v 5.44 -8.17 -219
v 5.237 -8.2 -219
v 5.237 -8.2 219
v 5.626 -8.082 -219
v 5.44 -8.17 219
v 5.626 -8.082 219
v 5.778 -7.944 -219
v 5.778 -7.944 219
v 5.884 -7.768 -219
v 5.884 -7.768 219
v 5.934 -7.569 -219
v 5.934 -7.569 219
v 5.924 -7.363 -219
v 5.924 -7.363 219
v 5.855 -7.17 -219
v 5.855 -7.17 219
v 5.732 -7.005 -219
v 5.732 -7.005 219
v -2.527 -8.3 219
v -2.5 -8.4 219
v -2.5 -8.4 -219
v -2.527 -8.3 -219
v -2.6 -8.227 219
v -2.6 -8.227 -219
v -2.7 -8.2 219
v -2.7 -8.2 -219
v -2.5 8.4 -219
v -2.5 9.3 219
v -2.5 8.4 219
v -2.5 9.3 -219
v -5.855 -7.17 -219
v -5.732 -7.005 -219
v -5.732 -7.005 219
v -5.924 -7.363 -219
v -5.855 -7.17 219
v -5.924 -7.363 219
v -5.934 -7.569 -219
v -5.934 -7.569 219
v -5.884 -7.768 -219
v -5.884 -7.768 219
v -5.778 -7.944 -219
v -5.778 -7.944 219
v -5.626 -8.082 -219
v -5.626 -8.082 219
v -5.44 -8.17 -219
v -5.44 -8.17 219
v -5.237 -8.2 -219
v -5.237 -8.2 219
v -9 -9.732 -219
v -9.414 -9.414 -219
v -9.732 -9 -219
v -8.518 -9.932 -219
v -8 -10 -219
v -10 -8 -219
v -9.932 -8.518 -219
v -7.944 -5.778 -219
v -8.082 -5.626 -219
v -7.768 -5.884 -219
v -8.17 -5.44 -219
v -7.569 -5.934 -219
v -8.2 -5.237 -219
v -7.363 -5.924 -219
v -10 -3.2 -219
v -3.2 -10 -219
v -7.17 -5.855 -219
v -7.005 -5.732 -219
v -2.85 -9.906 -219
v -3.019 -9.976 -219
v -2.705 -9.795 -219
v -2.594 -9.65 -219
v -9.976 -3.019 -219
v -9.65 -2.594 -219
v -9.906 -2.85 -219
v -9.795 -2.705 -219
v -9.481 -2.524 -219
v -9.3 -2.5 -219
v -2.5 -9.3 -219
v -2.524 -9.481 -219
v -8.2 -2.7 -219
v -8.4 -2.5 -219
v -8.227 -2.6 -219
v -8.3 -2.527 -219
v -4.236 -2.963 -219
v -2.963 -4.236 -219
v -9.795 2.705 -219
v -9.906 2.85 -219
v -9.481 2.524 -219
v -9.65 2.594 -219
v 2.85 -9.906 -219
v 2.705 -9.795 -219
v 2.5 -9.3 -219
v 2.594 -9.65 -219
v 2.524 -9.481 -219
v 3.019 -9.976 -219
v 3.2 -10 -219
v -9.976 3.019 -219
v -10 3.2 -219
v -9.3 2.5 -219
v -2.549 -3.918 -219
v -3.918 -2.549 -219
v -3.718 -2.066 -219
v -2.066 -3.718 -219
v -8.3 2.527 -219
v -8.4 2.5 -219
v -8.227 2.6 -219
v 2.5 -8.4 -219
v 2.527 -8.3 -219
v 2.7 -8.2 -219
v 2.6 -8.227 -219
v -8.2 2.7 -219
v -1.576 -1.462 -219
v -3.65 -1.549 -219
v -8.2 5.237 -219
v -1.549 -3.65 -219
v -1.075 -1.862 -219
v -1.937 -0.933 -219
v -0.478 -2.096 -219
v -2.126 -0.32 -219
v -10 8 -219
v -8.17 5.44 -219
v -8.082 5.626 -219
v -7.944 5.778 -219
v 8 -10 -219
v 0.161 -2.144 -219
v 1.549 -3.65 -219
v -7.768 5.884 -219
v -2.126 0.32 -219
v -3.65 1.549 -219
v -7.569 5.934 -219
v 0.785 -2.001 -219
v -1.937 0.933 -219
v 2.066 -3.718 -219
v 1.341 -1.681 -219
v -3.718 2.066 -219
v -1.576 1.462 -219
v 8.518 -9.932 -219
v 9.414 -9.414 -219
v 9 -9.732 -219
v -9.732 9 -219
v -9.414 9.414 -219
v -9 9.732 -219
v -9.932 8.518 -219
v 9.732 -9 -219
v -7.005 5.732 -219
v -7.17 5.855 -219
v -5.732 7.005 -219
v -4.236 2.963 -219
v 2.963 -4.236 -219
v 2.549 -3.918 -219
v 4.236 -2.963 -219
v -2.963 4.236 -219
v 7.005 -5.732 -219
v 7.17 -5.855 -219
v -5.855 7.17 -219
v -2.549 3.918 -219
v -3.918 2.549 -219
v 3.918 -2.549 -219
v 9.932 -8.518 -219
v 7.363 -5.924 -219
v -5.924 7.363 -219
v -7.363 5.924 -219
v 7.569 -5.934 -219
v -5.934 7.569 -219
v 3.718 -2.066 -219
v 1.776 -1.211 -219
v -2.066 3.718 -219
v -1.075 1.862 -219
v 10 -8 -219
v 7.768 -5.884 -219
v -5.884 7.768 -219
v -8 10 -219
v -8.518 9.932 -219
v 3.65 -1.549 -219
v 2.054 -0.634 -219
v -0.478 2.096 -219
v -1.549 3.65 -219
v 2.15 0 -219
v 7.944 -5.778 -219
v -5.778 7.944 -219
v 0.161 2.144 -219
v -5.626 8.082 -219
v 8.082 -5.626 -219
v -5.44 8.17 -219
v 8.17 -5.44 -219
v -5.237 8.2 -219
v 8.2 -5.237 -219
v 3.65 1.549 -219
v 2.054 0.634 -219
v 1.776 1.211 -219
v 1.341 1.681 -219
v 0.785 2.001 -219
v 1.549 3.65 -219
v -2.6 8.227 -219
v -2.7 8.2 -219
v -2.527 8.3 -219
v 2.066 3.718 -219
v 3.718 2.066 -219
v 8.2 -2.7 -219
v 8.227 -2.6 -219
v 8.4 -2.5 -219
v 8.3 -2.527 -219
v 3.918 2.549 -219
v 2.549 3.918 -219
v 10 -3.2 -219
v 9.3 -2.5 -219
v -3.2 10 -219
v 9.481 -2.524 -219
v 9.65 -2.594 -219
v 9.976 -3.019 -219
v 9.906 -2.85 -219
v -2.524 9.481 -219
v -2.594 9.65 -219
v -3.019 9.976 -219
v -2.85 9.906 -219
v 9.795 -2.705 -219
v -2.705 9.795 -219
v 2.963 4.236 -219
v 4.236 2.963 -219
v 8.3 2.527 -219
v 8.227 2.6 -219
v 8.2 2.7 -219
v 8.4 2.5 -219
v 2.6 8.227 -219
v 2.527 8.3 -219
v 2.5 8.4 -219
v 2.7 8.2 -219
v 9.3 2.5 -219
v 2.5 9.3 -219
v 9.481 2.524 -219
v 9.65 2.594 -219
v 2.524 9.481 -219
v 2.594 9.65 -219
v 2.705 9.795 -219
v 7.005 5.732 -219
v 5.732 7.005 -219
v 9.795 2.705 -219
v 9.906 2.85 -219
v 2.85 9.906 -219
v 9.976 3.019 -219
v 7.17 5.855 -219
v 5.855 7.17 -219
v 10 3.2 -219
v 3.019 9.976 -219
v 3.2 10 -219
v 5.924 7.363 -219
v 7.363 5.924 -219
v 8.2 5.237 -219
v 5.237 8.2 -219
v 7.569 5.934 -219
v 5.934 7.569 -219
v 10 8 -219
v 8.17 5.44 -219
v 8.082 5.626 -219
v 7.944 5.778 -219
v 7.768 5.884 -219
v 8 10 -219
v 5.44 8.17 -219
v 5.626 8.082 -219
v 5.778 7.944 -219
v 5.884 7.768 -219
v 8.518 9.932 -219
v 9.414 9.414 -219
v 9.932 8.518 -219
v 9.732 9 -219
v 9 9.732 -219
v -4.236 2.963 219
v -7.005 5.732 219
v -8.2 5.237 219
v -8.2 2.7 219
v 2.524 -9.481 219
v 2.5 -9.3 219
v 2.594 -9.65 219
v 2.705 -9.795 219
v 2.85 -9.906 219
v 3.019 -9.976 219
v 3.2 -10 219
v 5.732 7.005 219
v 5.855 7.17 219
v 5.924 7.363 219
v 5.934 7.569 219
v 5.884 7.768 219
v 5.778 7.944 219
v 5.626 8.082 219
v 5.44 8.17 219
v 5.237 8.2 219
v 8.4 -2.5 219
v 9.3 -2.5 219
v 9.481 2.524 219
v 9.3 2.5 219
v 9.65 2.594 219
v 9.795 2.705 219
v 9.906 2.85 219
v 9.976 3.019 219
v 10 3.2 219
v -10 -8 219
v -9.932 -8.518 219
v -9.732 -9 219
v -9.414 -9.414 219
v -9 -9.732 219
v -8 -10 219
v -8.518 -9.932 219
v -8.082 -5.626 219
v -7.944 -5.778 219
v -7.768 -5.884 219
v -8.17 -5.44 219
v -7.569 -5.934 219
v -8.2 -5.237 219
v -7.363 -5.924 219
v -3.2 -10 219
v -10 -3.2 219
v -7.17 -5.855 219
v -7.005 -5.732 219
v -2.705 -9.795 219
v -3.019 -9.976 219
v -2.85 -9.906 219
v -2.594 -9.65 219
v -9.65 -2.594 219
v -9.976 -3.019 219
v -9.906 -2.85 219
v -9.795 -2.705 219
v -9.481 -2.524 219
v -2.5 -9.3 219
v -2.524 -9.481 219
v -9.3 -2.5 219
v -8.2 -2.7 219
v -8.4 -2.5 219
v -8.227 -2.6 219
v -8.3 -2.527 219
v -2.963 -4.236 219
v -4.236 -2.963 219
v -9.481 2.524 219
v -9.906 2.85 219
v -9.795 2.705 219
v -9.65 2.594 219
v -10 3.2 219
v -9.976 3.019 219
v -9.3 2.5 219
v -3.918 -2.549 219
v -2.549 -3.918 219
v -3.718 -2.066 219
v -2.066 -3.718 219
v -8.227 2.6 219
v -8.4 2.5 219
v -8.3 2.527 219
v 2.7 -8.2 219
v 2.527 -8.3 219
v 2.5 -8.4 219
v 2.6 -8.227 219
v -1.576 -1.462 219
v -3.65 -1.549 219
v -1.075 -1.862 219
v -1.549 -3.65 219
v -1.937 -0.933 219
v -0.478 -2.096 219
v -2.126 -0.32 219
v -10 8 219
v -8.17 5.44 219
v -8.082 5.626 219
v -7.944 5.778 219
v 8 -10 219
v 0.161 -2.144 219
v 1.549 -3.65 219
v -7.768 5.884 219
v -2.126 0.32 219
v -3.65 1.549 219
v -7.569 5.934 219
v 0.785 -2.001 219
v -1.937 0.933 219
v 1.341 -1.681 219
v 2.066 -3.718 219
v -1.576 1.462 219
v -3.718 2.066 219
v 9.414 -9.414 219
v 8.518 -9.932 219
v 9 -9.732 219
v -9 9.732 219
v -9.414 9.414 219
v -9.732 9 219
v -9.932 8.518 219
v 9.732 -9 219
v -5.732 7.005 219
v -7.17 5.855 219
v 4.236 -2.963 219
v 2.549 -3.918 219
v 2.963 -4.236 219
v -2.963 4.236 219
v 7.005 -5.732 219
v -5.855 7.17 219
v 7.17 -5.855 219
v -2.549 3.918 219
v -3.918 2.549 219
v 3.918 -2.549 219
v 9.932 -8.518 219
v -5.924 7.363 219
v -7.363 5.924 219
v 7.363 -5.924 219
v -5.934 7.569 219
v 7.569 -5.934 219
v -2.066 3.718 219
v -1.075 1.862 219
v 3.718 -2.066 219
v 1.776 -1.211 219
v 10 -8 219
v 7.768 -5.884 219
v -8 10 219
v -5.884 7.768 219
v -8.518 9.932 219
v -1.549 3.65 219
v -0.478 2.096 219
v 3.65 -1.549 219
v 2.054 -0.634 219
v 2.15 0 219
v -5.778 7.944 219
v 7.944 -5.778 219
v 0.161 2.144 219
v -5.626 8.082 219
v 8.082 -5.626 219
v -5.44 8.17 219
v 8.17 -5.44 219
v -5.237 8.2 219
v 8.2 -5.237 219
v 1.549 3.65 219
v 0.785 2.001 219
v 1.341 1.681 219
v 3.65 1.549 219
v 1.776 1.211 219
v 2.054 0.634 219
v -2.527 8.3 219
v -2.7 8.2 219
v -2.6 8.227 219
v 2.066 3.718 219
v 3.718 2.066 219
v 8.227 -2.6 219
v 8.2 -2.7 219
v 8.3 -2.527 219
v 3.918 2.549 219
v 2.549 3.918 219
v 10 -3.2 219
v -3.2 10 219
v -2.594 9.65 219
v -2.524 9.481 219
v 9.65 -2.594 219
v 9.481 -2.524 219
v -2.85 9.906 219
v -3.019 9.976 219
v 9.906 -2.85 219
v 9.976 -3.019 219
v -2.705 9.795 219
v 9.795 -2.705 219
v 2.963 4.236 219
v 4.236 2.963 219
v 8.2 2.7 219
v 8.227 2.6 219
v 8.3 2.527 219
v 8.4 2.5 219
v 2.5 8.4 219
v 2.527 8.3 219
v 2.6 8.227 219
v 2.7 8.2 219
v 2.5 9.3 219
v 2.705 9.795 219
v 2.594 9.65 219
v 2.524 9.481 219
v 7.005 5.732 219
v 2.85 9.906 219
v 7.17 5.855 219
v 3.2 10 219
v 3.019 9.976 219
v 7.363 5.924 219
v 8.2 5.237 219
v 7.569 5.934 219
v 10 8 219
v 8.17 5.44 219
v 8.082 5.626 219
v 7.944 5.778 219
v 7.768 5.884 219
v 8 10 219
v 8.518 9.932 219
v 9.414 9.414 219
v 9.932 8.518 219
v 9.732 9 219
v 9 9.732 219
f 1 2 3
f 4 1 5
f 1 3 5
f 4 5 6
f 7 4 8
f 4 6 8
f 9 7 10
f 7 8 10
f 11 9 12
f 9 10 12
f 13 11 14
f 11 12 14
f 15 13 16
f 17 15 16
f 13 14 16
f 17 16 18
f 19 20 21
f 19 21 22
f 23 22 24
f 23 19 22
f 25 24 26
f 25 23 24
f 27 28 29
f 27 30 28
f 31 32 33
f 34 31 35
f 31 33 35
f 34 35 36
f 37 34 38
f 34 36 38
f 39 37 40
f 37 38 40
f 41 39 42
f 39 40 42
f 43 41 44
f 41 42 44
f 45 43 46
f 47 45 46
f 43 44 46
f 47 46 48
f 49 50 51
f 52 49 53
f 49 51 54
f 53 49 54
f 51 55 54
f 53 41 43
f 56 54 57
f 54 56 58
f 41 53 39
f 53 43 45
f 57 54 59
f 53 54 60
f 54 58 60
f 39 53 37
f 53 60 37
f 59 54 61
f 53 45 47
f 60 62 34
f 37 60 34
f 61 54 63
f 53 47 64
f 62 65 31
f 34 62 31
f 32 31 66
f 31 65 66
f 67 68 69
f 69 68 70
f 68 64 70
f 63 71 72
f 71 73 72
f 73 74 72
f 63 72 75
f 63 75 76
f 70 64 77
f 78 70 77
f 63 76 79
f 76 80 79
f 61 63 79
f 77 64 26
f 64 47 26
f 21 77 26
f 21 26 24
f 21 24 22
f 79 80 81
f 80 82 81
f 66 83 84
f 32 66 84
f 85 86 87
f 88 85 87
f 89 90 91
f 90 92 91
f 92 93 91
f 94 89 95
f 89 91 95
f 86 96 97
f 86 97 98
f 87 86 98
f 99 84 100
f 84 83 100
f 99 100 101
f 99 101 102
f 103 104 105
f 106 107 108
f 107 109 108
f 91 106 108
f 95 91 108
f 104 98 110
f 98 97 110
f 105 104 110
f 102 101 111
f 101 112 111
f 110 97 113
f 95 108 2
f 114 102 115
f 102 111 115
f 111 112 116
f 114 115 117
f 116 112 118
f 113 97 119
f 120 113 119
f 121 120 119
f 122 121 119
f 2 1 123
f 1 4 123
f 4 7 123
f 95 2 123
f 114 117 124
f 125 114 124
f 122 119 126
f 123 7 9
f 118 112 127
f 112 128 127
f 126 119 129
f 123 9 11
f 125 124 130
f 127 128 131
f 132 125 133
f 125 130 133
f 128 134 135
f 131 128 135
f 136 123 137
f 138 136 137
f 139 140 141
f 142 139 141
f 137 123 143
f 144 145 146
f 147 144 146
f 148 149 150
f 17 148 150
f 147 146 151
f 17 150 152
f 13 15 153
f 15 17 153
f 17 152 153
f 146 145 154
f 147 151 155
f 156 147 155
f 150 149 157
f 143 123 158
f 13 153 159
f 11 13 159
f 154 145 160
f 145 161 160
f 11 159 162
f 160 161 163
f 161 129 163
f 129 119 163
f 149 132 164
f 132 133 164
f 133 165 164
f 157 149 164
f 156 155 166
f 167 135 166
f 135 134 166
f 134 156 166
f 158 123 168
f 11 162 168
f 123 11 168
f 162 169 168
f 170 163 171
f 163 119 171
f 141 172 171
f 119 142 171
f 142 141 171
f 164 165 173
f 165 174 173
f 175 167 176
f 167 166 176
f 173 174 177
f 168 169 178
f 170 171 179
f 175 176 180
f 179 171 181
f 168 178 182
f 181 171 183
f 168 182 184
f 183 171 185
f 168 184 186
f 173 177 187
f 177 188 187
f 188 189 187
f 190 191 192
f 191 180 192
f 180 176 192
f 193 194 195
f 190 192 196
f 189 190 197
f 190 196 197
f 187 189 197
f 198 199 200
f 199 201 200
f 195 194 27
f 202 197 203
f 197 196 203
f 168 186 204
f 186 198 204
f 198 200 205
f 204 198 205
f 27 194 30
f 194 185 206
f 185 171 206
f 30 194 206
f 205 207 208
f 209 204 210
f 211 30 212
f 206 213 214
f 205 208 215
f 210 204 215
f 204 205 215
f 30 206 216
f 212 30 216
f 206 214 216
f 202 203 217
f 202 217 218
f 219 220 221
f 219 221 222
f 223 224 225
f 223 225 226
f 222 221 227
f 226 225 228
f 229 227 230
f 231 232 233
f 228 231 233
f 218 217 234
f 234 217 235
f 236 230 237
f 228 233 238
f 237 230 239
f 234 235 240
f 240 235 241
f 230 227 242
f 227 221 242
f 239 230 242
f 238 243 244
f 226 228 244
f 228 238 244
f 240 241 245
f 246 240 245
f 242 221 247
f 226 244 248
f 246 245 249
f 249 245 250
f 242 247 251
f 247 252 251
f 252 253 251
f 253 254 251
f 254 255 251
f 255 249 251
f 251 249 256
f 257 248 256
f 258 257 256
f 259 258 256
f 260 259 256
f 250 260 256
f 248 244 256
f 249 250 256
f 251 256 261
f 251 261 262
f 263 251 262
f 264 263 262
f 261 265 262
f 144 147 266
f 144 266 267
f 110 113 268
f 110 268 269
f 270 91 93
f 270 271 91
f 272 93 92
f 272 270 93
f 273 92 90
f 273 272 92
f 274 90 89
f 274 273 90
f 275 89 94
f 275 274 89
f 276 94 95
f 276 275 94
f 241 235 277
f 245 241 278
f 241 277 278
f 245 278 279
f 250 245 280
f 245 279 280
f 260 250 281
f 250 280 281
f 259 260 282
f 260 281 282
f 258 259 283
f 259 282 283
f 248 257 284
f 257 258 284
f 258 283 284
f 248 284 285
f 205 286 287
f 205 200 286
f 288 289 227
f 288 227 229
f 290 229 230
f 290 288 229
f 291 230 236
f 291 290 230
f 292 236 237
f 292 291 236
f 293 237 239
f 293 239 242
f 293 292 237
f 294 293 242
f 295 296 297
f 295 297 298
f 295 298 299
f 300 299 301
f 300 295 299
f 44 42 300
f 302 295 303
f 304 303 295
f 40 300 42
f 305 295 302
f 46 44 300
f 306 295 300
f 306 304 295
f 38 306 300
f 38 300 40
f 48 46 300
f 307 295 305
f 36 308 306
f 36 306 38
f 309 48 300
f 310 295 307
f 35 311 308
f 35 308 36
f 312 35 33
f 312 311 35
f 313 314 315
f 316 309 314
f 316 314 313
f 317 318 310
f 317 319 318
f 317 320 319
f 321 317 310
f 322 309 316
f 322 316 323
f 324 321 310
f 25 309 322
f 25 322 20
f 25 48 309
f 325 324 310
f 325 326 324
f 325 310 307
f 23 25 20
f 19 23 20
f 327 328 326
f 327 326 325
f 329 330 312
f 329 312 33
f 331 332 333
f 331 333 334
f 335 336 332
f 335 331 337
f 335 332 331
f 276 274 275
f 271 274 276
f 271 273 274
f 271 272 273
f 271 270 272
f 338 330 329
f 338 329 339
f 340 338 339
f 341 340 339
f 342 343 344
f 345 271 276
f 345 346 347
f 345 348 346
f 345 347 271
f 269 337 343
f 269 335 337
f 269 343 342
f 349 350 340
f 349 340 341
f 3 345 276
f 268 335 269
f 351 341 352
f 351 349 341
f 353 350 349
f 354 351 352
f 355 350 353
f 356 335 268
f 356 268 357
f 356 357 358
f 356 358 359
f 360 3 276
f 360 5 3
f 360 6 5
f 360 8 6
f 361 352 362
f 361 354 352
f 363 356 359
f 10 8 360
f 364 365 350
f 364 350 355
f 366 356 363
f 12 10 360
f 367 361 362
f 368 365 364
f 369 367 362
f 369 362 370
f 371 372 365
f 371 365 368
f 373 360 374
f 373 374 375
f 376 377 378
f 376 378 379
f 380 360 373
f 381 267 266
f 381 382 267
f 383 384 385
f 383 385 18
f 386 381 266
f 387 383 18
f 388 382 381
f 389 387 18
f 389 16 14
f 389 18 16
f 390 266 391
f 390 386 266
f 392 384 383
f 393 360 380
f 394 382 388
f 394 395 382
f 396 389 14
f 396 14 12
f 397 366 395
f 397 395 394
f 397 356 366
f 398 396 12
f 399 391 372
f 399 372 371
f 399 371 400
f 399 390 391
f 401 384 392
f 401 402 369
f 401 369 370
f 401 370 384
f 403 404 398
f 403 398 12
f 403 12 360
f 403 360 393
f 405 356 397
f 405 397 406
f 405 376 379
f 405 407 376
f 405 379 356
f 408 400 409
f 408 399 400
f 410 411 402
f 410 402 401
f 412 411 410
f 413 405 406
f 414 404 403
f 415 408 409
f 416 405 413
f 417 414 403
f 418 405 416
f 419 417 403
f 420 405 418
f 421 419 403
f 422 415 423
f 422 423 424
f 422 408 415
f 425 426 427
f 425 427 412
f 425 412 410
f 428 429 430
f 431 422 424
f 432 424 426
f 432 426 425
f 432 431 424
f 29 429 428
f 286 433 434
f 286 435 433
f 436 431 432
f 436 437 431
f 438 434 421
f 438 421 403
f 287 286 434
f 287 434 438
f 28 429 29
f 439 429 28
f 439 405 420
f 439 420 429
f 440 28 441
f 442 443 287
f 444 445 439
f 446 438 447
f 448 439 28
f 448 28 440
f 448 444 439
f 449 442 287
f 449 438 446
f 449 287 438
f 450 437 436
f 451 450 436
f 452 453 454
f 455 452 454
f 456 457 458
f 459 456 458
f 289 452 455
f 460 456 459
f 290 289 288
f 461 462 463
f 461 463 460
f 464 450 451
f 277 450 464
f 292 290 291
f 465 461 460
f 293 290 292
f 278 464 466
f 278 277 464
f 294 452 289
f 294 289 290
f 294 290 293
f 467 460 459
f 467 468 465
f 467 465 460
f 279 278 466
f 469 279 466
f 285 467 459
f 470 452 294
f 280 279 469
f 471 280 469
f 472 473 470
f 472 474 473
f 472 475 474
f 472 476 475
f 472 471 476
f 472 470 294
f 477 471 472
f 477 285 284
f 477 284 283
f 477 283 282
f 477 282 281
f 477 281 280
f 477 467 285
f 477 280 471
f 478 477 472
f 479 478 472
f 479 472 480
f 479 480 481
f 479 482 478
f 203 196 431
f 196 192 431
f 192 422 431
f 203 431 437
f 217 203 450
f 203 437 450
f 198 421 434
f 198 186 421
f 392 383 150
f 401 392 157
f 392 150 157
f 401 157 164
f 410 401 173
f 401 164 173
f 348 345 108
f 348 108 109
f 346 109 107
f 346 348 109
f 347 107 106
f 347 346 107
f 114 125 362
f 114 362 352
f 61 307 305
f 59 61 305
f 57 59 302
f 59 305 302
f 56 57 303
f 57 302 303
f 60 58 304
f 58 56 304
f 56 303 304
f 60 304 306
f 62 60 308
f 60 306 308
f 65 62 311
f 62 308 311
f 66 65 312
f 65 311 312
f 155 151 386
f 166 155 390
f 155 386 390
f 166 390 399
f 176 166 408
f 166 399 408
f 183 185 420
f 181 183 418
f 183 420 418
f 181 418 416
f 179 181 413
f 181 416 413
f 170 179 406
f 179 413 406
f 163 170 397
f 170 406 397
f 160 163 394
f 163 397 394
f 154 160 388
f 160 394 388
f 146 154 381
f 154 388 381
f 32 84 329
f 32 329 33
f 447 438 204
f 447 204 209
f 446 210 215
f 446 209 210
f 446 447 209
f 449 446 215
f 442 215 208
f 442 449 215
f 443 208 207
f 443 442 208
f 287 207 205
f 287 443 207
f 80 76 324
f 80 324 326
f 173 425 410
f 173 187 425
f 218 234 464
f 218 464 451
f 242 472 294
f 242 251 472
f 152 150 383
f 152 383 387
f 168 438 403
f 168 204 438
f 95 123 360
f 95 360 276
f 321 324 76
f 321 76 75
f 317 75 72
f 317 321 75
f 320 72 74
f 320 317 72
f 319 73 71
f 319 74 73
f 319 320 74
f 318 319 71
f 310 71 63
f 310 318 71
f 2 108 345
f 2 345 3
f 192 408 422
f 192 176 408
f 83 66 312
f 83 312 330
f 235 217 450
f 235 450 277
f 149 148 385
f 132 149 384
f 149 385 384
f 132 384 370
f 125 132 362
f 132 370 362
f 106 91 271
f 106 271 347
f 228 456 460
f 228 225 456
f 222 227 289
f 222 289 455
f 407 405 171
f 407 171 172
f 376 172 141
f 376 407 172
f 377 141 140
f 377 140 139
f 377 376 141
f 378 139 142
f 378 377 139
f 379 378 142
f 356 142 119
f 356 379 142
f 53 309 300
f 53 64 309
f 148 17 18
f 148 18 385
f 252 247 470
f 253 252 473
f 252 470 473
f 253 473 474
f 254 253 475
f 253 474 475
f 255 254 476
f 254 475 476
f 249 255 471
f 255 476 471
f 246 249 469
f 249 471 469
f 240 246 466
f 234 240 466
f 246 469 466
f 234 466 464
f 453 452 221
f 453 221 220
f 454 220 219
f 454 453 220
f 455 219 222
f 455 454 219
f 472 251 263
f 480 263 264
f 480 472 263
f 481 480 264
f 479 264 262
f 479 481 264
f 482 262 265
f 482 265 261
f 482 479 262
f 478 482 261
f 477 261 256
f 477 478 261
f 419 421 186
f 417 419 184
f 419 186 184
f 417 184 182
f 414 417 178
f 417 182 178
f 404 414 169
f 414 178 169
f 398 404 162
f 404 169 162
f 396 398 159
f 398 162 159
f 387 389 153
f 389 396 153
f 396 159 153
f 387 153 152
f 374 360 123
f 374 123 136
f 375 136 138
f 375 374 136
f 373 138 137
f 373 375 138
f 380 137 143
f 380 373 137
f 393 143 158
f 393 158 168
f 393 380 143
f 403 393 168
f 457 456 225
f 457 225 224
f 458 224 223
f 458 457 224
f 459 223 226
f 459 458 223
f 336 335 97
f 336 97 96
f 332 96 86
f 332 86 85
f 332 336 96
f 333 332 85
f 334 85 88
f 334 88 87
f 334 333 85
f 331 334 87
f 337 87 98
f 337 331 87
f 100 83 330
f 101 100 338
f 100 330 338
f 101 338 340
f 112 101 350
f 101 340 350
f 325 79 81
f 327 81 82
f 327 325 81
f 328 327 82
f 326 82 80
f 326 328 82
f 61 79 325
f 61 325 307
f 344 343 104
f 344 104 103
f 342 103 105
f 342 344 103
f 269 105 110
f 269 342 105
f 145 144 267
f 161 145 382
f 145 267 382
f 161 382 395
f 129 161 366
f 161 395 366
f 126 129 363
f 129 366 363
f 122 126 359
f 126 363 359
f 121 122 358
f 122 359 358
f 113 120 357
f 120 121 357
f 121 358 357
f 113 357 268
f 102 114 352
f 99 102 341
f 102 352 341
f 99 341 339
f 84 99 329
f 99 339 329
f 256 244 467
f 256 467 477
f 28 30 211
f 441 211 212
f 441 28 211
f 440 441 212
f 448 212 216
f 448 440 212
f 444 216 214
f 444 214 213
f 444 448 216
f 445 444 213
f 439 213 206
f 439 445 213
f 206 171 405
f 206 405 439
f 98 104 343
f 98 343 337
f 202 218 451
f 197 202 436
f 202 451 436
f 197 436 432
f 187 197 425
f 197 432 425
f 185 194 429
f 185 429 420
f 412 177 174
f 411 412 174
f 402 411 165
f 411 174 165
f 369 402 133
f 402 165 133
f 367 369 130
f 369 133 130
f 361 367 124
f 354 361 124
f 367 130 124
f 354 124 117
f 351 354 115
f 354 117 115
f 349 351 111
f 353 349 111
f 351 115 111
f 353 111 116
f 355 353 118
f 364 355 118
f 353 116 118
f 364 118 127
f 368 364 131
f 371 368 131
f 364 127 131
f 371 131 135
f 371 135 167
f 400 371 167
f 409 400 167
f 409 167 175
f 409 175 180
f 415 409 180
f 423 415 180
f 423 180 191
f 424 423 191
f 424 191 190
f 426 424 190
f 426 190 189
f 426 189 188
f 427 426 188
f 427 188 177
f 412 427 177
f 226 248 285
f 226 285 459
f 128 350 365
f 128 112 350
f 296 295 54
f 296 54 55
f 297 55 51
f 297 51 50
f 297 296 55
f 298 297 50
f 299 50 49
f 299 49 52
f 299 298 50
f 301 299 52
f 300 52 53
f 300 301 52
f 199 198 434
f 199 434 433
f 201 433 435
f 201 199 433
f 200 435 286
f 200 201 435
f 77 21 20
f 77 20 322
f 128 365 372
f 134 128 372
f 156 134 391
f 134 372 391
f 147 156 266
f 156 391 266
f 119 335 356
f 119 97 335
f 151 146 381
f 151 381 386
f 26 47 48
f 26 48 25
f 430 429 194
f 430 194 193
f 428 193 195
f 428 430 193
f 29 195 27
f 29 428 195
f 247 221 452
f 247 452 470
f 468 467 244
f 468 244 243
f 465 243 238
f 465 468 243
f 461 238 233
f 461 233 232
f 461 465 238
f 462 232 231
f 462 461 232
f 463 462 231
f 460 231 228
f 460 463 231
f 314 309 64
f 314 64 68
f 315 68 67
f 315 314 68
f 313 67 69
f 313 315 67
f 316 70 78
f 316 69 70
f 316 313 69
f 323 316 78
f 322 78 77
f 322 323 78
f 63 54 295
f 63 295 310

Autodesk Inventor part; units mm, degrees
ref_plane "YZ Plane" through (0, 0, 0) normal (1, 0, 0) x (0, 1, 0)
ref_plane "XZ Plane" through (0, 0, 0) normal (0, 1, 0) x (-1, 0, 0)
ref_plane "XY Plane" through (0, 0, 0) normal (0, 0, 1) x (1, 0, 0)
sketch "Sketch1" plane through (0, 0, 0) normal (0, 0, 1) x (1, 0, 0)
  circle A0 centre (0, 0) radius 2.15
  line L0 (-10, 10) -> (-2.5, 10)
  line L1 (-2.5, 10) -> (-2.5, 8.2)
  line L2 (-2.5, 8.2) -> (-6.9272, 8.2)
  line L3 (-6.9272, 8.2) -> (-2.3772, 3.65)
  line L4 (-2.3772, 3.65) -> (2.3772, 3.65)
  line L5 (2.3772, 3.65) -> (6.9272, 8.2)
  line L6 (6.9272, 8.2) -> (2.5, 8.2)
  line L7 (2.5, 8.2) -> (2.5, 10)
  line L8 (2.5, 10) -> (10, 10)
  line L9 (10, 10) -> (10, 2.5)
  line L10 (10, 2.5) -> (8.2, 2.5)
  line L11 (8.2, 2.5) -> (8.2, 6.9272)
  line L12 (8.2, 6.9272) -> (3.65, 2.3772)
  line L13 (3.65, 2.3772) -> (3.65, -2.3772)
  line L14 (3.65, -2.3772) -> (8.2, -6.9272)
  line L15 (8.2, -6.9272) -> (8.2, -2.5)
  line L16 (8.2, -2.5) -> (10, -2.5)
  line L17 (10, -2.5) -> (10, -10)
  line L18 (10, -10) -> (2.5, -10)
  line L19 (2.5, -10) -> (2.5, -8.2)
  line L20 (2.5, -8.2) -> (6.9272, -8.2)
  line L21 (6.9272, -8.2) -> (2.3772, -3.65)
  line L22 (2.3772, -3.65) -> (-2.3772, -3.65)
  line L23 (-2.3772, -3.65) -> (-6.9272, -8.2)
  line L24 (-6.9272, -8.2) -> (-2.5, -8.2)
  line L25 (-2.5, -8.2) -> (-2.5, -10)
  line L26 (-2.5, -10) -> (-10, -10)
  line L27 (-10, -10) -> (-10, -2.5)
  line L28 (-10, -2.5) -> (-8.2, -2.5)
  line L29 (-8.2, -2.5) -> (-8.2, -6.9272)
  line L30 (-8.2, -6.9272) -> (-3.65, -2.3772)
  line L31 (-3.65, -2.3772) -> (-3.65, 2.3772)
  line L32 (-3.65, 2.3772) -> (-8.2, 6.9272)
  line L33 (-8.2, 6.9272) -> (-8.2, 2.5)
  line L34 (-8.2, 2.5) -> (-10, 2.5)
  line L35 (-10, 2.5) -> (-10, 10)
  line L36 (0, 0) -> (-30.8654, 30.8654)
  line L37 (0, 0) -> (30.8654, 30.8654)
  line L38 (0, 0) -> (42.5392, 0)
  line L39 (0, 0) -> (0, 44.3419)
  dimension "d0" = 45
  dimension "d1" = 90
  dimension "Breite" = 20
  dimension "Tiefe_Schiene" = 6.35
  dimension "d2" = 1.8
  dimension "Durchmesser_Loch" = 4.3
  dimension "Wandstaerke" = 1.8
  dimension "d3" = 1.8
  dimension "Breite_Schiene" = 5
  dimension "d4" = 5
extrude "Extrusion1" add sketch "Sketch1" along normal mid plane 438 contours L38 L13 L14 L15 L16 L17 L18 L19 L20 L21 L22 L23 L24 L25 L26 L27 L28 L29 L30 L31 L32 L33 L34 L35 L36 A0 | A0 L37 L9 L10 L11 L12 L13 L38 | A0 L39 L4 L5 L6 L7 L8 L37 | L36 L0 L1 L2 L3 L4 L39 A0
fillet "Fillet1" radius 2 4 edges at (10, 10, 0) (-10, 10, 0) (10, -10, 0) (-10, -10, 0)
fillet "Fillet2" radius 0.2 8 edges at (-2.5, 8.2, 0) (2.5, 8.2, 0) (8.2, 2.5, 0) (8.2, -2.5, 0) (-2.5, -8.2, 0) (-8.2, -2.5, 0) (-8.2, 2.5, 0) (2.5, -8.2, 0)
fillet "Fillet3" radius 0.7 16 edges at (-2.5, 10, 0) (2.5, 10, 0) (10, 2.5, 0) (10, -2.5, 0) (2.5, -10, 0) (-2.5, -10, 0) (-10, -2.5, 0) (-10, 2.5, 0) (-6.9272, -8.2, 0) (-8.2, -6.9272, 0) (6.9272, -8.2, 0) (8.2, -6.9272, 0) (8.2, 6.9272, 0) (6.9272, 8.2, 0) (-6.9272, 8.2, 0) (-8.2, 6.9272, 0)
fillet "Fillet4" radius 2 8 edges at (-3.65, 2.3772, 0) (-2.3772, 3.65, 0) (2.3772, 3.65, 0) (3.65, 2.3772, 0) (3.65, -2.3772, 0) (2.3772, -3.65, 0) (-2.3772, -3.65, 0) (-3.65, -2.3772, 0)
equation "\"d2\" = Wandstaerke"
equation "\"d3\" = Wandstaerke"
equation "\"d4\" = Breite_Schiene"
properties part number "501.015.01_ITEM_20x20_510mm"
